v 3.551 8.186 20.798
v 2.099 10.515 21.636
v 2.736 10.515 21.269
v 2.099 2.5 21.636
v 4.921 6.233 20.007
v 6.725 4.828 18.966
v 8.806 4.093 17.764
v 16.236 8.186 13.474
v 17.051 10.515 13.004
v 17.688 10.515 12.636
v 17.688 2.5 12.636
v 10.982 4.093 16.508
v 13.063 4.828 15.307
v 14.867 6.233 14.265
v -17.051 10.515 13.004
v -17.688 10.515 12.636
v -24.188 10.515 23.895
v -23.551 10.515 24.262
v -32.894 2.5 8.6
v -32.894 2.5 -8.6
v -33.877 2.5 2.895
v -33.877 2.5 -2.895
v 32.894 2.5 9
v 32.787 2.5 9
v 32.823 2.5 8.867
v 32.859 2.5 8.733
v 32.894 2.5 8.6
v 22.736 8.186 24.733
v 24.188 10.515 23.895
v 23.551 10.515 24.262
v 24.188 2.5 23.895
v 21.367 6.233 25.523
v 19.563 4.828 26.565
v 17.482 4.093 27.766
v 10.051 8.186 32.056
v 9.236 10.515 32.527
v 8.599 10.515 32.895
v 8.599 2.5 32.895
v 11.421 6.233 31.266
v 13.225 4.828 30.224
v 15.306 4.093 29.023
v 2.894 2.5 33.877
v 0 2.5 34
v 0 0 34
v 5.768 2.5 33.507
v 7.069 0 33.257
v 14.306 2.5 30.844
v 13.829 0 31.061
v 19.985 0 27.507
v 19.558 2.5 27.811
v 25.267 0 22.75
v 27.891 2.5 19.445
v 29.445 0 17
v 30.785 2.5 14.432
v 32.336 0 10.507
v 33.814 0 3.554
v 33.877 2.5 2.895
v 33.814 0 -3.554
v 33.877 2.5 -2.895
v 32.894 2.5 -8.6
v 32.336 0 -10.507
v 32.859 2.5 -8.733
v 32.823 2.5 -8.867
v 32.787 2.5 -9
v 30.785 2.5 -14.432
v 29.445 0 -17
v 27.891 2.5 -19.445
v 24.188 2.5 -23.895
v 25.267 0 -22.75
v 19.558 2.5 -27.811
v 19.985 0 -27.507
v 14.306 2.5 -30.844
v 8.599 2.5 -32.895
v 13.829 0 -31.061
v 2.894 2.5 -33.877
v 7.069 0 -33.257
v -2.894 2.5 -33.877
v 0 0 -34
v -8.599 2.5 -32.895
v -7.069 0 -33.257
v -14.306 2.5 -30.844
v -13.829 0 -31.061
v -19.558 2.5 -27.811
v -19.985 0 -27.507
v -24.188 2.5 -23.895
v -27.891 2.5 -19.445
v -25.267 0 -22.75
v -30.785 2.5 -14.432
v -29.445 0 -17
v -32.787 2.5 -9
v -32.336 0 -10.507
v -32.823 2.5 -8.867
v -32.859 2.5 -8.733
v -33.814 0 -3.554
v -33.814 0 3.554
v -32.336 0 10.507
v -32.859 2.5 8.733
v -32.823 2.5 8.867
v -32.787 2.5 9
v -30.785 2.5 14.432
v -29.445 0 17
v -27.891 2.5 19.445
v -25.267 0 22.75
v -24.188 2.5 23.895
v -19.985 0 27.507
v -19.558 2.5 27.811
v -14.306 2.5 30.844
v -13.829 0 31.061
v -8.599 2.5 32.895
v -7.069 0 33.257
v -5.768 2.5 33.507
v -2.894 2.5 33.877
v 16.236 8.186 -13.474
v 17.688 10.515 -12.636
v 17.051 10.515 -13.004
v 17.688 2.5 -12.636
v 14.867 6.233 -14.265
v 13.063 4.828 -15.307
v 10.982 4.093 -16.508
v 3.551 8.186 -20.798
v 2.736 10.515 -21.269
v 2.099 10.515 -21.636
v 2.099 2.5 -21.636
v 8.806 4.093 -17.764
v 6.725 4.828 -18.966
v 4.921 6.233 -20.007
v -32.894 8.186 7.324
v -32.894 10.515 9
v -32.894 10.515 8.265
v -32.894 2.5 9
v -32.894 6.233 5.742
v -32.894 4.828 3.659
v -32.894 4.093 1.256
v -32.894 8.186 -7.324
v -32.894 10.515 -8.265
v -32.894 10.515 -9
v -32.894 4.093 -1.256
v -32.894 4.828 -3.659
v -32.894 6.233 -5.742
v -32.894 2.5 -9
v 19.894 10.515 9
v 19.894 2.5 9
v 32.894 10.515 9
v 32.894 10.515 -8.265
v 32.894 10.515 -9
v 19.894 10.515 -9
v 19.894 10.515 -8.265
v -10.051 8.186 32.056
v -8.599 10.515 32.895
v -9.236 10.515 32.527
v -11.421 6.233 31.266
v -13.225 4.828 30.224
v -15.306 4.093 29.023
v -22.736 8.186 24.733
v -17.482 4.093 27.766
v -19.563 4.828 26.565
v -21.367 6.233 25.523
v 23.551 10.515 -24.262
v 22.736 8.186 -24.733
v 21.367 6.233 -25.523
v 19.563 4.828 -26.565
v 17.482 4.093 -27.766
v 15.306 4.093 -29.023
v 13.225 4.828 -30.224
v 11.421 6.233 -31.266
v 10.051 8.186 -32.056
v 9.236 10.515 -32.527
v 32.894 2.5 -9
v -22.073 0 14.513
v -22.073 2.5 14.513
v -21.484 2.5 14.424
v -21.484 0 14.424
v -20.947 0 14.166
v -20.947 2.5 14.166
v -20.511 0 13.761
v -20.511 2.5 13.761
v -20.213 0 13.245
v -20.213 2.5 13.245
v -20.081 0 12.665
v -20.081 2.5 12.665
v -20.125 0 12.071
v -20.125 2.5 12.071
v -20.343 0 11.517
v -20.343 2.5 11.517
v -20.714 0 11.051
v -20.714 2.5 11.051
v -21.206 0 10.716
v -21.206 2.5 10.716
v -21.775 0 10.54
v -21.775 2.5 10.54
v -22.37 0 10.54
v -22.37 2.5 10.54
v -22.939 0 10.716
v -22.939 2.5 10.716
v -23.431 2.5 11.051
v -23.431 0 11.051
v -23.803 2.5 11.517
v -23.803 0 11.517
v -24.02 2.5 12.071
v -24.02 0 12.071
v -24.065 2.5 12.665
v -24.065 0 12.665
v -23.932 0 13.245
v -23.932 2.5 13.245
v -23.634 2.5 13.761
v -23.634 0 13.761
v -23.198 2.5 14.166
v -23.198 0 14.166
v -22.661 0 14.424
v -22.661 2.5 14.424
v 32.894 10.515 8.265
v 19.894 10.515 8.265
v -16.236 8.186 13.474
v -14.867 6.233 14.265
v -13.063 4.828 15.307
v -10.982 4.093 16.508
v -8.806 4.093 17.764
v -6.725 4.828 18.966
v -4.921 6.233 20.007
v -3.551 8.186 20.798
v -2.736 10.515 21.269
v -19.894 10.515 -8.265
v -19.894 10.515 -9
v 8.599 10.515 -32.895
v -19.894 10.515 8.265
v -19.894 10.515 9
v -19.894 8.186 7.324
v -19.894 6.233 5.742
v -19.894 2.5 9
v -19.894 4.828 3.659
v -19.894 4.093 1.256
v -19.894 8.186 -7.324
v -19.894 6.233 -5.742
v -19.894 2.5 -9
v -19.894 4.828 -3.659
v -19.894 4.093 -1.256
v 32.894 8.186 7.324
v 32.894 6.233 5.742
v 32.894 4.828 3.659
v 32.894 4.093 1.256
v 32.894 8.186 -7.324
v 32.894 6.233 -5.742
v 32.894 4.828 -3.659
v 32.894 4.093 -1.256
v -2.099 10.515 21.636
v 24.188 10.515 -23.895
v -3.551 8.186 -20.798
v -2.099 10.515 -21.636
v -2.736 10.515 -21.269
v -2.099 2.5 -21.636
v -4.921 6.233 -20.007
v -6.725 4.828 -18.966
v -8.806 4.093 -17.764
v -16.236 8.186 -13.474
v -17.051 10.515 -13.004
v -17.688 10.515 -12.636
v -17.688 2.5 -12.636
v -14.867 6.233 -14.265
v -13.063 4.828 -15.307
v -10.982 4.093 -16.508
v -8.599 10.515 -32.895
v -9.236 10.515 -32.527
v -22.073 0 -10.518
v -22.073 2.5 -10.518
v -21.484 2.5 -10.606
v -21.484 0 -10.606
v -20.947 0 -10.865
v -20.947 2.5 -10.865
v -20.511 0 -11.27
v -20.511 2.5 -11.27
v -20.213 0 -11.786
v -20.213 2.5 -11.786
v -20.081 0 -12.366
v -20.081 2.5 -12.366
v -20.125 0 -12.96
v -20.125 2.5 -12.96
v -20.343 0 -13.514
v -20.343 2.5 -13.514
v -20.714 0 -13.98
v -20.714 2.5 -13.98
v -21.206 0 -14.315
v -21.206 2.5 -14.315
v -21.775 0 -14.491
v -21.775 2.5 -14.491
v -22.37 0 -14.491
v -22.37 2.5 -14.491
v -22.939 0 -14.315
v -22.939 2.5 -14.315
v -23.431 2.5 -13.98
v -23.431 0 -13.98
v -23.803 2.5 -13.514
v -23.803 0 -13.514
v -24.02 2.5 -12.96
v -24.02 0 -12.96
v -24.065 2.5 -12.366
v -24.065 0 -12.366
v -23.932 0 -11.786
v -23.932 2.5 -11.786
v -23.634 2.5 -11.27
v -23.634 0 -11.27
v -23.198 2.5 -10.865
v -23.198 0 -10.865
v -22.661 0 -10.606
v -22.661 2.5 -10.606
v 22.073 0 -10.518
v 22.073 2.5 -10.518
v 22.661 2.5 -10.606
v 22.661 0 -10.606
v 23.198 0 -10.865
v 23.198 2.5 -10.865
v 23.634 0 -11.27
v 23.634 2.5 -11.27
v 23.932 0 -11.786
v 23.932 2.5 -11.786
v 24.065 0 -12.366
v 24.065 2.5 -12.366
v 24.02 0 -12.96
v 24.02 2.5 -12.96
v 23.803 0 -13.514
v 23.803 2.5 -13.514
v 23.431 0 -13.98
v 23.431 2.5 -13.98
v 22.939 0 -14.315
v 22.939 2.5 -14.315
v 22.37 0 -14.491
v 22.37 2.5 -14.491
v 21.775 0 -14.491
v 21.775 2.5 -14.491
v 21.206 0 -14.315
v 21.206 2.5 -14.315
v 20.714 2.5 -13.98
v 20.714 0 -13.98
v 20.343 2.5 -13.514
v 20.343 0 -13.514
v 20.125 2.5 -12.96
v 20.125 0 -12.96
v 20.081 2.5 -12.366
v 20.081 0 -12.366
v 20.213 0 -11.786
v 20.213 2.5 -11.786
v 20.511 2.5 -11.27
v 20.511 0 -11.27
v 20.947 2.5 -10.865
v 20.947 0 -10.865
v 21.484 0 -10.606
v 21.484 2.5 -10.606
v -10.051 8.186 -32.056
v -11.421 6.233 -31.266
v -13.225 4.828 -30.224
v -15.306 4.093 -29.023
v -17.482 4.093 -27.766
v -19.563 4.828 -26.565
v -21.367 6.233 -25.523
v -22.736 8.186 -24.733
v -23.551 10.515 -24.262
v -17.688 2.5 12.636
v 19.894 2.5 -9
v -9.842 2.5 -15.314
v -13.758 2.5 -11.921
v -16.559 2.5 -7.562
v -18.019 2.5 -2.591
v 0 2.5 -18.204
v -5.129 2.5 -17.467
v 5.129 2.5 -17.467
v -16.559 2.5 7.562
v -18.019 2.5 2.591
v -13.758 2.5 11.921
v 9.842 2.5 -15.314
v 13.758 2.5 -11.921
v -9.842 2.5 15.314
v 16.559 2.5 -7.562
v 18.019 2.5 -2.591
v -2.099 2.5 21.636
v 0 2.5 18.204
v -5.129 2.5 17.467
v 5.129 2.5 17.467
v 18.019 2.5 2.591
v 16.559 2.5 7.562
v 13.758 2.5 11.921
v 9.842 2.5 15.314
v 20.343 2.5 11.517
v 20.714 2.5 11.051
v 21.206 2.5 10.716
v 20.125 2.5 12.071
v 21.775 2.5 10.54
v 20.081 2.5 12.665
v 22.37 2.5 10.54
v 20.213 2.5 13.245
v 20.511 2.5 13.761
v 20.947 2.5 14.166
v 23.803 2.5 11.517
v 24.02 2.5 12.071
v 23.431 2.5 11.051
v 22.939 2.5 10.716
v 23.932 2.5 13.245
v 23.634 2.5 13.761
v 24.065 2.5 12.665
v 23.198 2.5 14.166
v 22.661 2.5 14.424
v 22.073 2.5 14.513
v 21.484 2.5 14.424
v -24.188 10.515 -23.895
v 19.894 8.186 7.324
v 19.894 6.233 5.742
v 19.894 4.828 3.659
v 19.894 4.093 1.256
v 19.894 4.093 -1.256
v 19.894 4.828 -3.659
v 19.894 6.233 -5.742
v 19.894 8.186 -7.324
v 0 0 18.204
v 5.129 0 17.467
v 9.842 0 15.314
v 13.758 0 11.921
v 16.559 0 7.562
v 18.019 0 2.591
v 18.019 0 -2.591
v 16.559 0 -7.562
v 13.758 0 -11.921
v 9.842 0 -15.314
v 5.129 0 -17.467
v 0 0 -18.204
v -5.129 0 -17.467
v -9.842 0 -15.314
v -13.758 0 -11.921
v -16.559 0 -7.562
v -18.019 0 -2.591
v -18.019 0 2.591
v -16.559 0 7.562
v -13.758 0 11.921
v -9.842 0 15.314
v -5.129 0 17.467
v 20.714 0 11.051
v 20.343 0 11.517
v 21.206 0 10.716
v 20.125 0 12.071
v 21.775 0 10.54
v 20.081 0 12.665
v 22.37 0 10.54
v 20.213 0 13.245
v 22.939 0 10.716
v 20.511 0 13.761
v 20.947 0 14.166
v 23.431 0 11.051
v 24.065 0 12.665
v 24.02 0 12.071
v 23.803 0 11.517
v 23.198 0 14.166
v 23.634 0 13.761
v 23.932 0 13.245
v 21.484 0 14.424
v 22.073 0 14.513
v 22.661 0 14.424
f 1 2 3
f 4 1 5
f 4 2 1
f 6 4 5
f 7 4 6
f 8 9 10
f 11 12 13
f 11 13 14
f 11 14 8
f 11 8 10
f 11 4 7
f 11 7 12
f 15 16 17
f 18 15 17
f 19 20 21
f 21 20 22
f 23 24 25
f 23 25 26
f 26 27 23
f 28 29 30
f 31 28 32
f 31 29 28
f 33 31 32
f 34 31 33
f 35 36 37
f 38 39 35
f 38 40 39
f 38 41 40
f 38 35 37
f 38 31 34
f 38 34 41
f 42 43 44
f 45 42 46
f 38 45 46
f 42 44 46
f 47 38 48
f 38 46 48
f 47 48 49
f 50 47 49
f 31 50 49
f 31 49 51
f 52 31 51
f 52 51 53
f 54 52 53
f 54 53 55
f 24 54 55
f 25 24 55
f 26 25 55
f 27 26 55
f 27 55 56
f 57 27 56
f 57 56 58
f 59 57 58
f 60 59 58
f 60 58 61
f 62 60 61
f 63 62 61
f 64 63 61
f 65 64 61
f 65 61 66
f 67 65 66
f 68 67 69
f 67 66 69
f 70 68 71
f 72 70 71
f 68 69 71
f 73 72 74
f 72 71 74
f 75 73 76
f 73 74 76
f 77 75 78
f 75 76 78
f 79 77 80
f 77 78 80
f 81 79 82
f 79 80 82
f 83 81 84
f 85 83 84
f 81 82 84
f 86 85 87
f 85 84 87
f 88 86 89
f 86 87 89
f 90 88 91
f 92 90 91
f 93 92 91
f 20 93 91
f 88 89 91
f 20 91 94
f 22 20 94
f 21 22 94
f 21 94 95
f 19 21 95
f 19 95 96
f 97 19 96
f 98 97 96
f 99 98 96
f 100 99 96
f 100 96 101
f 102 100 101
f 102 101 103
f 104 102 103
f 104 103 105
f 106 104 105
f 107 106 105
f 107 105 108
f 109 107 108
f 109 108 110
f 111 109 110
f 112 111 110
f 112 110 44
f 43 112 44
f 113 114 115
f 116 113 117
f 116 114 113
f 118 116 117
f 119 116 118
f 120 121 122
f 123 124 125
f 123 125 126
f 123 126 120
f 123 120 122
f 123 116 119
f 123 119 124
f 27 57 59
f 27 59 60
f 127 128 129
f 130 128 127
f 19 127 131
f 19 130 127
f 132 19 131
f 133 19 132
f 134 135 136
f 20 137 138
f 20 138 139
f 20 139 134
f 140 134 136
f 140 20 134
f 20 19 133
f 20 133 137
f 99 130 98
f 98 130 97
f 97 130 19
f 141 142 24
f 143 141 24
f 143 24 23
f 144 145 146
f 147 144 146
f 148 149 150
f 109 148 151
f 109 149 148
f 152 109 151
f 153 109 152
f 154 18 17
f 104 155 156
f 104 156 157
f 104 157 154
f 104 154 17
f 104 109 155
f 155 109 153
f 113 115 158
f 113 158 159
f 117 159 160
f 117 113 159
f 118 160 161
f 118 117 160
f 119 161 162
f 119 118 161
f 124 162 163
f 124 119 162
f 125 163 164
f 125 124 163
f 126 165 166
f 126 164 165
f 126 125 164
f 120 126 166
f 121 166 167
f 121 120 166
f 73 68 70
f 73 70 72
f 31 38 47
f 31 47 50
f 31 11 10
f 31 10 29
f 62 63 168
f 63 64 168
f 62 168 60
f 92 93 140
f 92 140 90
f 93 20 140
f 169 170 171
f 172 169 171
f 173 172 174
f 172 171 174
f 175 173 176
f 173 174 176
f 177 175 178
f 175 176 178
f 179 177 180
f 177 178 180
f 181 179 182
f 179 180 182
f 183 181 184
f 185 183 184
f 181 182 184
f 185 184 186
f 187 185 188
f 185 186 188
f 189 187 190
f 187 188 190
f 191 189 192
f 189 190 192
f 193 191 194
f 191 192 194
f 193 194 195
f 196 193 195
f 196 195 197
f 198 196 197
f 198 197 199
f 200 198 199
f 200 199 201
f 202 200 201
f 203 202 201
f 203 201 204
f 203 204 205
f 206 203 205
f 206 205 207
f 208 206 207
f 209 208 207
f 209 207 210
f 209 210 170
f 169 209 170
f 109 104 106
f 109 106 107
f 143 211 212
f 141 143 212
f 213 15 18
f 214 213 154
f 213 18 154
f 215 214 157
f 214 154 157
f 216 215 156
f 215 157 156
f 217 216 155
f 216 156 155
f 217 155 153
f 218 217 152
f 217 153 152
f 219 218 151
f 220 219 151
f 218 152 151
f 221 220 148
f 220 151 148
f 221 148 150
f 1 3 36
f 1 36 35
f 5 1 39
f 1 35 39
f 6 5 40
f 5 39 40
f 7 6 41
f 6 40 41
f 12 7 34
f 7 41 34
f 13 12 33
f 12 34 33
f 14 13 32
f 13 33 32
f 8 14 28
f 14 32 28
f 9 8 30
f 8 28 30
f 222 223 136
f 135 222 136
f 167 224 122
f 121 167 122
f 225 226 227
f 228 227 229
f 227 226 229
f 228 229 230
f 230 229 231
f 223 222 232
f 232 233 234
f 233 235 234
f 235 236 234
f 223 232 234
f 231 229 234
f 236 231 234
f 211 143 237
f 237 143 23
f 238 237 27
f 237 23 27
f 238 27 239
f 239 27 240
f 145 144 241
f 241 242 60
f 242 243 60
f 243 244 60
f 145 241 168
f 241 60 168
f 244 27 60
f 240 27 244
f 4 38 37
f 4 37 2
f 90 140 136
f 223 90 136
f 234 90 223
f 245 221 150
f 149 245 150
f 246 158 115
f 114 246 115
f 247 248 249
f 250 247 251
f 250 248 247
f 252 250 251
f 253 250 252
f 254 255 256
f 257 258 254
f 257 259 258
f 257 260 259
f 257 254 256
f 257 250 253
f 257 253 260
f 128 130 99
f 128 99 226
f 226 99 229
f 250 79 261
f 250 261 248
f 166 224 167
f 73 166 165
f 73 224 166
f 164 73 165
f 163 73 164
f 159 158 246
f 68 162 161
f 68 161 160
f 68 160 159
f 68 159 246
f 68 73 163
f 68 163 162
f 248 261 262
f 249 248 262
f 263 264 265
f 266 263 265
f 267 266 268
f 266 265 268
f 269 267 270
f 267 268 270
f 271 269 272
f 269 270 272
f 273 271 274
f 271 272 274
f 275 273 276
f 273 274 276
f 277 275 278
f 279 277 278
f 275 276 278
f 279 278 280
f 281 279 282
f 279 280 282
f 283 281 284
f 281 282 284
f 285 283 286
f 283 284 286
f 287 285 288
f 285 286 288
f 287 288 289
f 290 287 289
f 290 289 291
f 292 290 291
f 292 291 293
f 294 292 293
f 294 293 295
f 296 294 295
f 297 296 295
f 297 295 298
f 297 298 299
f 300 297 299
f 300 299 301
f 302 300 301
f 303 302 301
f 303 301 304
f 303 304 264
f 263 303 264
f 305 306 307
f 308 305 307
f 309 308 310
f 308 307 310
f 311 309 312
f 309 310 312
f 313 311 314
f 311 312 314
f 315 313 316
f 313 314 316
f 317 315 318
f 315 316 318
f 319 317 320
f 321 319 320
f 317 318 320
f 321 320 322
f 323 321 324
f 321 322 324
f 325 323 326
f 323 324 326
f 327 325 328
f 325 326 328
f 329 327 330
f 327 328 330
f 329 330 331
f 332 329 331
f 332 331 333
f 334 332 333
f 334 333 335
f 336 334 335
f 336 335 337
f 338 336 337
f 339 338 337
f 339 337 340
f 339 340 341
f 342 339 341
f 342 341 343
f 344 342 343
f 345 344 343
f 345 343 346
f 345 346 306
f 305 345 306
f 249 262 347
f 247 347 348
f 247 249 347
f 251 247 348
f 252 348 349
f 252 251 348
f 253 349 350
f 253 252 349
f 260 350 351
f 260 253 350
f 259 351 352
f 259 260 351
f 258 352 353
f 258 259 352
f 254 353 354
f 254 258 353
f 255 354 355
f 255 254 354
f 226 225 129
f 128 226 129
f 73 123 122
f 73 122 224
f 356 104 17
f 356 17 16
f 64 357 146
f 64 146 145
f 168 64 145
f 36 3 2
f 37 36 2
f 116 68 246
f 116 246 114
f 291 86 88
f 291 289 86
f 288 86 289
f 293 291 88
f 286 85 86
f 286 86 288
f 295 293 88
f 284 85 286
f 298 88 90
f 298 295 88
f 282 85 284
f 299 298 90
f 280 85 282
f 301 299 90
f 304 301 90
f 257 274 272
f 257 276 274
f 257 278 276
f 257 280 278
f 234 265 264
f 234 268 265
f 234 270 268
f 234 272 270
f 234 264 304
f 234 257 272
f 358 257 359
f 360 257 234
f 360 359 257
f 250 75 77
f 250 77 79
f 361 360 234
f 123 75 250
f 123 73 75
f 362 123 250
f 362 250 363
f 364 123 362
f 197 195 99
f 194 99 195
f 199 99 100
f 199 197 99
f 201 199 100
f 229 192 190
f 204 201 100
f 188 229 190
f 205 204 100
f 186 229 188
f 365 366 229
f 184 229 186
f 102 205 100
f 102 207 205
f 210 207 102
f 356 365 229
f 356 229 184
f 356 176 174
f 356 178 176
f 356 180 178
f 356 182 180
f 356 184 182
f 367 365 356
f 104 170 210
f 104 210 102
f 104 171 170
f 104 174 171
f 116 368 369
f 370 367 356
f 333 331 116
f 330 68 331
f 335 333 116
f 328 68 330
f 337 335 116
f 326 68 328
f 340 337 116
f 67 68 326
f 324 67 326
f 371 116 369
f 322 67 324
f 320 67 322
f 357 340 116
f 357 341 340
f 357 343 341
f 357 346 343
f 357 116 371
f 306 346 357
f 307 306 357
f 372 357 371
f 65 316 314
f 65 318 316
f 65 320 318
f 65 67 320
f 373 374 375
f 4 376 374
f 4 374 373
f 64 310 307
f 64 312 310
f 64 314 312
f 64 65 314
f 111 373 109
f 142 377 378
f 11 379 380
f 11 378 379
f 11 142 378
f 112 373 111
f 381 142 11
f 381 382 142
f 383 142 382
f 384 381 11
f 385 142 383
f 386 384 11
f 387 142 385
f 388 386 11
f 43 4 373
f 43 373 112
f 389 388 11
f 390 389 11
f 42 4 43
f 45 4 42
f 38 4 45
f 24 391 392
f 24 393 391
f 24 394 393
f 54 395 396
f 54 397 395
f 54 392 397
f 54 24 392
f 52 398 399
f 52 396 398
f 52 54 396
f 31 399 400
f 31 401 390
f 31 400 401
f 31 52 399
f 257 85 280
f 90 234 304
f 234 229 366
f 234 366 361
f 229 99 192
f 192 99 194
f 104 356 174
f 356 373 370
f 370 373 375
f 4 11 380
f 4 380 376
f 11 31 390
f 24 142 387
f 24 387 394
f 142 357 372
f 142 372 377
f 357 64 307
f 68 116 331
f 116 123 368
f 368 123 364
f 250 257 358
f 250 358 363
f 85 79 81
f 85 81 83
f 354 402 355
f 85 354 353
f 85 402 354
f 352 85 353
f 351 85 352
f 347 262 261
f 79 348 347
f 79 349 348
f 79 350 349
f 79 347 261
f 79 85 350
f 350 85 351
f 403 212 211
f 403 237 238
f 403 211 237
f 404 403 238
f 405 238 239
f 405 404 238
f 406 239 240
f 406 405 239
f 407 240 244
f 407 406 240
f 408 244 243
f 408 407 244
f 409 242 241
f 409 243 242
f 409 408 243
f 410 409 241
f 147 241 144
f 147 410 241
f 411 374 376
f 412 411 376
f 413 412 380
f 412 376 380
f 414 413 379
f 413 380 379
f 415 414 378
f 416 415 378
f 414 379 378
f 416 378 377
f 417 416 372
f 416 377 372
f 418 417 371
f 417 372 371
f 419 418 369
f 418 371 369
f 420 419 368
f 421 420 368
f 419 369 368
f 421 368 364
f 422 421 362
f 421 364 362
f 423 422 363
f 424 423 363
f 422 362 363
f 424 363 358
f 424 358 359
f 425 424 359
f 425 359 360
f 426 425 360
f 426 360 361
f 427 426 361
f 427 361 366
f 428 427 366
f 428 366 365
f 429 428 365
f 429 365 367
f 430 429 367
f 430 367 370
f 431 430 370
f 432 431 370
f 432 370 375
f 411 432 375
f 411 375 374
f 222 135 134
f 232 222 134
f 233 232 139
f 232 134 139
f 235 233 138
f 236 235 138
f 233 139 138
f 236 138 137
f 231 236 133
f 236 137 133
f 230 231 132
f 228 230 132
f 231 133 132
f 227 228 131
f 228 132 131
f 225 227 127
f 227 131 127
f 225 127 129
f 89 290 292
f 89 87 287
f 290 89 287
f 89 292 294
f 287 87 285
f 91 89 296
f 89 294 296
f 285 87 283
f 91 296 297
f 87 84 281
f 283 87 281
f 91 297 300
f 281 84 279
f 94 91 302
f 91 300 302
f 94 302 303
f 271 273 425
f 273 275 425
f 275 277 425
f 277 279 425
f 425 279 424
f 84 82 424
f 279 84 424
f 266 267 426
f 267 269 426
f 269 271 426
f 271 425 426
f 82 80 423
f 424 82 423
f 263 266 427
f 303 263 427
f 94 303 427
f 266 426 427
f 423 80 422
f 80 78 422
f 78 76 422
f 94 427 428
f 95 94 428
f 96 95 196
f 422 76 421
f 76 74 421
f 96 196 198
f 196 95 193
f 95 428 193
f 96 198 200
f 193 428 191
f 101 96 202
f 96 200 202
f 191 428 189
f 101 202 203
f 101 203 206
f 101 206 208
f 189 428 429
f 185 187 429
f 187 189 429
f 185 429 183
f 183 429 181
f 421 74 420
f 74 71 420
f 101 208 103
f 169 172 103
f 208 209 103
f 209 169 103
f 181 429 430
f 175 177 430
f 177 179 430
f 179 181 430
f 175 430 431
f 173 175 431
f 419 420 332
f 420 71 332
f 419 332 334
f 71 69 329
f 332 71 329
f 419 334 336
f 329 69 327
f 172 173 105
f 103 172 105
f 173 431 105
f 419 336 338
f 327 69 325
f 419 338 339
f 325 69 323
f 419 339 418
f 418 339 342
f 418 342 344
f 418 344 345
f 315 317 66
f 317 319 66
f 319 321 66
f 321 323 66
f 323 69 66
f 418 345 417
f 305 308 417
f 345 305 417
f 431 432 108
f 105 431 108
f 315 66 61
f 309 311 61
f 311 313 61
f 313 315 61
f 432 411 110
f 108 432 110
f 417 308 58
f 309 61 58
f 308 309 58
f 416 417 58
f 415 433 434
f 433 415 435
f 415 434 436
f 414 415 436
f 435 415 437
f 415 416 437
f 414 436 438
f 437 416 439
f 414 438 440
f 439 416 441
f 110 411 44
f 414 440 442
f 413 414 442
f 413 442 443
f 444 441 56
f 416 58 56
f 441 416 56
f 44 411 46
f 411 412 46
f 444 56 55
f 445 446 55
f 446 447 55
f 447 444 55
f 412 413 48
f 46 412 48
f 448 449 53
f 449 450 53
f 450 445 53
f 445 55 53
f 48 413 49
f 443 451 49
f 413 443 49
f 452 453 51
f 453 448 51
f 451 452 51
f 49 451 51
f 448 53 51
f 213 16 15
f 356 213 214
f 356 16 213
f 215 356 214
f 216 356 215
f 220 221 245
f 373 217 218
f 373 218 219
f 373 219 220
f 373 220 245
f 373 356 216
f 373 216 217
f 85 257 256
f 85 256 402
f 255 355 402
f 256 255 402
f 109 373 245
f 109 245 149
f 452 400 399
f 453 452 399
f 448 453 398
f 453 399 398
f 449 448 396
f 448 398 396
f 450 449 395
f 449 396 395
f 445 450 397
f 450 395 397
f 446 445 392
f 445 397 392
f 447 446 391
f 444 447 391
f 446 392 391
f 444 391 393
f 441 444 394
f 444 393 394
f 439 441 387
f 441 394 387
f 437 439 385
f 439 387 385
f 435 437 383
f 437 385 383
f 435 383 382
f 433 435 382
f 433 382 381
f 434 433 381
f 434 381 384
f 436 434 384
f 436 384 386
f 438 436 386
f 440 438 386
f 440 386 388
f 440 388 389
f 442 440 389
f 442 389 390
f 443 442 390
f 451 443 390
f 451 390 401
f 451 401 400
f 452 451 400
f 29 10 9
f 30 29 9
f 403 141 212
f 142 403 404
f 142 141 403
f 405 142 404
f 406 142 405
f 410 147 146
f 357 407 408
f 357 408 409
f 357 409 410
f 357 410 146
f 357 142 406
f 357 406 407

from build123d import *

# Parameters (mm, degrees)
SKETCH1_R           = 42.5
BOSS_EXTRUDE1_DEPTH = 2.5
SKETCH3_W           = 13
SKETCH3_H           = 18
BOSS_EXTRUDE2_DEPTH = 20
SKETCH4_R           = 8.5
CUT_EXTRUDE2_DEPTH  = 20
SKETCH5_R           = 8.5
CUT_EXTRUDE3_DEPTH  = 20
SKETCH6_R           = 8.5
CUT_EXTRUDE4_DEPTH  = 20
CUT_EXTRUDE5_START  = -20
SKETCH7_R           = 8.5
CUT_EXTRUDE5_DEPTH  = 20
CUT_EXTRUDE6_START  = -20
SKETCH8_R           = 8.5
CUT_EXTRUDE6_DEPTH  = 20
CUT_EXTRUDE7_START  = -20
SKETCH9_R           = 8.5
CUT_EXTRUDE7_DEPTH  = 20
CUT_EXTRUDE8_DEPTH  = 76.388
SKETCH11_W          = 71.811217628
SKETCH11_H          = 11.984599711
CUT_EXTRUDE9_DEPTH  = 76.388
SKETCH12_R          = 18.204170311
CUT_EXTRUDE10_DEPTH = 76.388
SKETCH13_R          = 1.997627935
CUT_EXTRUDE11_DEPTH = 10
CUT_EXTRUDE13_START = -24
SKETCH15_R          = 42.5
SKETCH15_R_2        = 34
CUT_EXTRUDE13_DEPTH = 24


with BuildPart() as part:
    # Sketch1 → Boss-Extrude1 (new body)
    with BuildSketch(Plane(origin=(0, 0, 0), x_dir=(1, 0, 0), z_dir=(0, 1, 0))):
        Circle(SKETCH1_R)
    extrude(amount=BOSS_EXTRUDE1_DEPTH)

    # Sketch3 → Boss-Extrude2 (add)
    with BuildSketch(Plane(origin=(0, 2.5, 0), x_dir=(1, 0, 0), z_dir=(0, 1, 0))):
        with Locations((-26.394376419, 0)):
            Rectangle(SKETCH3_W, SKETCH3_H)
        with Locations((26.394376419, 0)):
            Rectangle(SKETCH3_W, SKETCH3_H)
        Polygon((-8.599367677, 32.894541729), (-2.099367677, 21.63621148), (-17.687824945, 12.63621148), (-24.187824945, 23.894541729), align=None)
        Polygon((8.599367677, 32.894541729), (24.187824945, 23.894541729), (17.687824945, 12.63621148), (2.099367677, 21.63621148), align=None)
        Polygon((8.599367677, -32.894541729), (2.099367677, -21.63621148), (17.687824945, -12.63621148), (24.187824945, -23.894541729), align=None)
        Polygon((-8.599367677, -32.894541729), (-24.187824945, -23.894541729), (-17.687824945, -12.63621148), (-2.099367677, -21.63621148), align=None)
    extrude(amount=BOSS_EXTRUDE2_DEPTH)

    # Sketch4 → Cut-Extrude2 (cut)
    with BuildSketch(Plane.ZY.offset(32.894376419)):
        with Locations((0, 12.5)):
            Circle(SKETCH4_R)
    extrude(amount=-CUT_EXTRUDE2_DEPTH, mode=Mode.SUBTRACT)

    # Sketch5 → Cut-Extrude3 (cut)
    with BuildSketch(Plane(origin=(-16.393596311, 0, 28.394541729), x_dir=(0.8660254037844386, 0, 0.5000000000000003), z_dir=(-0.5000000000000003, 0, 0.8660254037844386))):
        with Locations((0, 12.5)):
            Circle(SKETCH5_R)
    extrude(amount=-CUT_EXTRUDE3_DEPTH, mode=Mode.SUBTRACT)

    # Sketch6 → Cut-Extrude4 (cut)
    with BuildSketch(Plane(origin=(16.393596311, 0, 28.394541729), x_dir=(0.8660254037844386, 0, -0.5000000000000003), z_dir=(0.5000000000000003, 0, 0.8660254037844386))):
        with Locations((0, 12.5)):
            Circle(SKETCH6_R)
    extrude(amount=-CUT_EXTRUDE4_DEPTH, mode=Mode.SUBTRACT)

    # Sketch7 → Cut-Extrude5 (cut)
    with BuildSketch(Plane(origin=(32.894376419, 0, 0), x_dir=(0, 0, -1), z_dir=(1, 0, 0)).offset(CUT_EXTRUDE5_START)):
        with Locations((0, 12.5)):
            Circle(SKETCH7_R)
    extrude(amount=CUT_EXTRUDE5_DEPTH, mode=Mode.SUBTRACT)

    # Sketch8 → Cut-Extrude6 (cut)
    with BuildSketch(Plane(origin=(16.393596311, 0, -28.394541729), x_dir=(-0.8660254037844386, 0, -0.5000000000000003), z_dir=(0.5000000000000003, 0, -0.8660254037844386)).offset(CUT_EXTRUDE6_START)):
        with Locations((0, 12.5)):
            Circle(SKETCH8_R)
    extrude(amount=CUT_EXTRUDE6_DEPTH, mode=Mode.SUBTRACT)

    # Sketch9 → Cut-Extrude7 (cut)
    with BuildSketch(Plane(origin=(-16.393596311, 0, -28.394541729), x_dir=(-0.8660254037844386, 0, 0.5000000000000003), z_dir=(-0.5000000000000003, 0, -0.8660254037844386)).offset(CUT_EXTRUDE7_START)):
        with Locations((0, 12.5)):
            Circle(SKETCH9_R)
    extrude(amount=CUT_EXTRUDE7_DEPTH, mode=Mode.SUBTRACT)

    # Sketch10 → Cut-Extrude8 (cut)
    with BuildSketch(Plane(origin=(-16.393596311, 0, -28.394541729), x_dir=(-0.8660254037844386, 0, 0.5000000000000003), z_dir=(-0.5000000000000003, 0, -0.8660254037844386))):
        Polygon((-35.669118209, 17.957805899), (-9, 17.957805899), (-9, 22.5), (9, 22.5), (9, 17.957805899), (33.747549551, 17.957805899), (33.747549551, 25.559573076), (-35.669118209, 25.559573076), align=None)
    extrude(amount=-CUT_EXTRUDE8_DEPTH, mode=Mode.SUBTRACT)

    # Sketch11 → Cut-Extrude9 (cut)
    with BuildSketch(Plane(origin=(-16.393596311, 0, -28.394541729), x_dir=(-0.8660254037844386, 0, 0.5000000000000003), z_dir=(-0.5000000000000003, 0, -0.8660254037844386))):
        with Locations((1.515702587, 16.507700144)):
            Rectangle(SKETCH11_W, SKETCH11_H)
    extrude(amount=-CUT_EXTRUDE9_DEPTH, mode=Mode.SUBTRACT)

    # Sketch12 → Cut-Extrude10 (cut)
    with BuildSketch(Plane(origin=(0, 2.5, 0), x_dir=(1, 0, 0), z_dir=(0, 1, 0))):
        Circle(SKETCH12_R)
    extrude(amount=-CUT_EXTRUDE10_DEPTH, mode=Mode.SUBTRACT)

    # Sketch13 → Cut-Extrude11 (cut)
    with BuildSketch(Plane(origin=(0, 2.5, 0), x_dir=(1, 0, 0), z_dir=(0, 1, 0))):
        with Locations((-22.072556502, 12.515367089)):
            Circle(SKETCH13_R)
        with Locations((22.072556502, 12.515367089)):
            Circle(SKETCH13_R)
        with Locations((22.072556502, -12.515367089)):
            Circle(SKETCH13_R)
        with Locations((-22.072556502, -12.515367089)):
            Circle(SKETCH13_R)
    extrude(amount=-CUT_EXTRUDE11_DEPTH, mode=Mode.SUBTRACT)

    # Sketch15 → Cut-Extrude13 (cut)
    with BuildSketch(Plane(origin=(0, 2.5, 0), x_dir=(1, 0, 0), z_dir=(0, 1, 0)).offset(CUT_EXTRUDE13_START)):
        Circle(SKETCH15_R)
        Circle(SKETCH15_R_2, mode=Mode.SUBTRACT)
    extrude(amount=CUT_EXTRUDE13_DEPTH, mode=Mode.SUBTRACT)


solid = part.part
